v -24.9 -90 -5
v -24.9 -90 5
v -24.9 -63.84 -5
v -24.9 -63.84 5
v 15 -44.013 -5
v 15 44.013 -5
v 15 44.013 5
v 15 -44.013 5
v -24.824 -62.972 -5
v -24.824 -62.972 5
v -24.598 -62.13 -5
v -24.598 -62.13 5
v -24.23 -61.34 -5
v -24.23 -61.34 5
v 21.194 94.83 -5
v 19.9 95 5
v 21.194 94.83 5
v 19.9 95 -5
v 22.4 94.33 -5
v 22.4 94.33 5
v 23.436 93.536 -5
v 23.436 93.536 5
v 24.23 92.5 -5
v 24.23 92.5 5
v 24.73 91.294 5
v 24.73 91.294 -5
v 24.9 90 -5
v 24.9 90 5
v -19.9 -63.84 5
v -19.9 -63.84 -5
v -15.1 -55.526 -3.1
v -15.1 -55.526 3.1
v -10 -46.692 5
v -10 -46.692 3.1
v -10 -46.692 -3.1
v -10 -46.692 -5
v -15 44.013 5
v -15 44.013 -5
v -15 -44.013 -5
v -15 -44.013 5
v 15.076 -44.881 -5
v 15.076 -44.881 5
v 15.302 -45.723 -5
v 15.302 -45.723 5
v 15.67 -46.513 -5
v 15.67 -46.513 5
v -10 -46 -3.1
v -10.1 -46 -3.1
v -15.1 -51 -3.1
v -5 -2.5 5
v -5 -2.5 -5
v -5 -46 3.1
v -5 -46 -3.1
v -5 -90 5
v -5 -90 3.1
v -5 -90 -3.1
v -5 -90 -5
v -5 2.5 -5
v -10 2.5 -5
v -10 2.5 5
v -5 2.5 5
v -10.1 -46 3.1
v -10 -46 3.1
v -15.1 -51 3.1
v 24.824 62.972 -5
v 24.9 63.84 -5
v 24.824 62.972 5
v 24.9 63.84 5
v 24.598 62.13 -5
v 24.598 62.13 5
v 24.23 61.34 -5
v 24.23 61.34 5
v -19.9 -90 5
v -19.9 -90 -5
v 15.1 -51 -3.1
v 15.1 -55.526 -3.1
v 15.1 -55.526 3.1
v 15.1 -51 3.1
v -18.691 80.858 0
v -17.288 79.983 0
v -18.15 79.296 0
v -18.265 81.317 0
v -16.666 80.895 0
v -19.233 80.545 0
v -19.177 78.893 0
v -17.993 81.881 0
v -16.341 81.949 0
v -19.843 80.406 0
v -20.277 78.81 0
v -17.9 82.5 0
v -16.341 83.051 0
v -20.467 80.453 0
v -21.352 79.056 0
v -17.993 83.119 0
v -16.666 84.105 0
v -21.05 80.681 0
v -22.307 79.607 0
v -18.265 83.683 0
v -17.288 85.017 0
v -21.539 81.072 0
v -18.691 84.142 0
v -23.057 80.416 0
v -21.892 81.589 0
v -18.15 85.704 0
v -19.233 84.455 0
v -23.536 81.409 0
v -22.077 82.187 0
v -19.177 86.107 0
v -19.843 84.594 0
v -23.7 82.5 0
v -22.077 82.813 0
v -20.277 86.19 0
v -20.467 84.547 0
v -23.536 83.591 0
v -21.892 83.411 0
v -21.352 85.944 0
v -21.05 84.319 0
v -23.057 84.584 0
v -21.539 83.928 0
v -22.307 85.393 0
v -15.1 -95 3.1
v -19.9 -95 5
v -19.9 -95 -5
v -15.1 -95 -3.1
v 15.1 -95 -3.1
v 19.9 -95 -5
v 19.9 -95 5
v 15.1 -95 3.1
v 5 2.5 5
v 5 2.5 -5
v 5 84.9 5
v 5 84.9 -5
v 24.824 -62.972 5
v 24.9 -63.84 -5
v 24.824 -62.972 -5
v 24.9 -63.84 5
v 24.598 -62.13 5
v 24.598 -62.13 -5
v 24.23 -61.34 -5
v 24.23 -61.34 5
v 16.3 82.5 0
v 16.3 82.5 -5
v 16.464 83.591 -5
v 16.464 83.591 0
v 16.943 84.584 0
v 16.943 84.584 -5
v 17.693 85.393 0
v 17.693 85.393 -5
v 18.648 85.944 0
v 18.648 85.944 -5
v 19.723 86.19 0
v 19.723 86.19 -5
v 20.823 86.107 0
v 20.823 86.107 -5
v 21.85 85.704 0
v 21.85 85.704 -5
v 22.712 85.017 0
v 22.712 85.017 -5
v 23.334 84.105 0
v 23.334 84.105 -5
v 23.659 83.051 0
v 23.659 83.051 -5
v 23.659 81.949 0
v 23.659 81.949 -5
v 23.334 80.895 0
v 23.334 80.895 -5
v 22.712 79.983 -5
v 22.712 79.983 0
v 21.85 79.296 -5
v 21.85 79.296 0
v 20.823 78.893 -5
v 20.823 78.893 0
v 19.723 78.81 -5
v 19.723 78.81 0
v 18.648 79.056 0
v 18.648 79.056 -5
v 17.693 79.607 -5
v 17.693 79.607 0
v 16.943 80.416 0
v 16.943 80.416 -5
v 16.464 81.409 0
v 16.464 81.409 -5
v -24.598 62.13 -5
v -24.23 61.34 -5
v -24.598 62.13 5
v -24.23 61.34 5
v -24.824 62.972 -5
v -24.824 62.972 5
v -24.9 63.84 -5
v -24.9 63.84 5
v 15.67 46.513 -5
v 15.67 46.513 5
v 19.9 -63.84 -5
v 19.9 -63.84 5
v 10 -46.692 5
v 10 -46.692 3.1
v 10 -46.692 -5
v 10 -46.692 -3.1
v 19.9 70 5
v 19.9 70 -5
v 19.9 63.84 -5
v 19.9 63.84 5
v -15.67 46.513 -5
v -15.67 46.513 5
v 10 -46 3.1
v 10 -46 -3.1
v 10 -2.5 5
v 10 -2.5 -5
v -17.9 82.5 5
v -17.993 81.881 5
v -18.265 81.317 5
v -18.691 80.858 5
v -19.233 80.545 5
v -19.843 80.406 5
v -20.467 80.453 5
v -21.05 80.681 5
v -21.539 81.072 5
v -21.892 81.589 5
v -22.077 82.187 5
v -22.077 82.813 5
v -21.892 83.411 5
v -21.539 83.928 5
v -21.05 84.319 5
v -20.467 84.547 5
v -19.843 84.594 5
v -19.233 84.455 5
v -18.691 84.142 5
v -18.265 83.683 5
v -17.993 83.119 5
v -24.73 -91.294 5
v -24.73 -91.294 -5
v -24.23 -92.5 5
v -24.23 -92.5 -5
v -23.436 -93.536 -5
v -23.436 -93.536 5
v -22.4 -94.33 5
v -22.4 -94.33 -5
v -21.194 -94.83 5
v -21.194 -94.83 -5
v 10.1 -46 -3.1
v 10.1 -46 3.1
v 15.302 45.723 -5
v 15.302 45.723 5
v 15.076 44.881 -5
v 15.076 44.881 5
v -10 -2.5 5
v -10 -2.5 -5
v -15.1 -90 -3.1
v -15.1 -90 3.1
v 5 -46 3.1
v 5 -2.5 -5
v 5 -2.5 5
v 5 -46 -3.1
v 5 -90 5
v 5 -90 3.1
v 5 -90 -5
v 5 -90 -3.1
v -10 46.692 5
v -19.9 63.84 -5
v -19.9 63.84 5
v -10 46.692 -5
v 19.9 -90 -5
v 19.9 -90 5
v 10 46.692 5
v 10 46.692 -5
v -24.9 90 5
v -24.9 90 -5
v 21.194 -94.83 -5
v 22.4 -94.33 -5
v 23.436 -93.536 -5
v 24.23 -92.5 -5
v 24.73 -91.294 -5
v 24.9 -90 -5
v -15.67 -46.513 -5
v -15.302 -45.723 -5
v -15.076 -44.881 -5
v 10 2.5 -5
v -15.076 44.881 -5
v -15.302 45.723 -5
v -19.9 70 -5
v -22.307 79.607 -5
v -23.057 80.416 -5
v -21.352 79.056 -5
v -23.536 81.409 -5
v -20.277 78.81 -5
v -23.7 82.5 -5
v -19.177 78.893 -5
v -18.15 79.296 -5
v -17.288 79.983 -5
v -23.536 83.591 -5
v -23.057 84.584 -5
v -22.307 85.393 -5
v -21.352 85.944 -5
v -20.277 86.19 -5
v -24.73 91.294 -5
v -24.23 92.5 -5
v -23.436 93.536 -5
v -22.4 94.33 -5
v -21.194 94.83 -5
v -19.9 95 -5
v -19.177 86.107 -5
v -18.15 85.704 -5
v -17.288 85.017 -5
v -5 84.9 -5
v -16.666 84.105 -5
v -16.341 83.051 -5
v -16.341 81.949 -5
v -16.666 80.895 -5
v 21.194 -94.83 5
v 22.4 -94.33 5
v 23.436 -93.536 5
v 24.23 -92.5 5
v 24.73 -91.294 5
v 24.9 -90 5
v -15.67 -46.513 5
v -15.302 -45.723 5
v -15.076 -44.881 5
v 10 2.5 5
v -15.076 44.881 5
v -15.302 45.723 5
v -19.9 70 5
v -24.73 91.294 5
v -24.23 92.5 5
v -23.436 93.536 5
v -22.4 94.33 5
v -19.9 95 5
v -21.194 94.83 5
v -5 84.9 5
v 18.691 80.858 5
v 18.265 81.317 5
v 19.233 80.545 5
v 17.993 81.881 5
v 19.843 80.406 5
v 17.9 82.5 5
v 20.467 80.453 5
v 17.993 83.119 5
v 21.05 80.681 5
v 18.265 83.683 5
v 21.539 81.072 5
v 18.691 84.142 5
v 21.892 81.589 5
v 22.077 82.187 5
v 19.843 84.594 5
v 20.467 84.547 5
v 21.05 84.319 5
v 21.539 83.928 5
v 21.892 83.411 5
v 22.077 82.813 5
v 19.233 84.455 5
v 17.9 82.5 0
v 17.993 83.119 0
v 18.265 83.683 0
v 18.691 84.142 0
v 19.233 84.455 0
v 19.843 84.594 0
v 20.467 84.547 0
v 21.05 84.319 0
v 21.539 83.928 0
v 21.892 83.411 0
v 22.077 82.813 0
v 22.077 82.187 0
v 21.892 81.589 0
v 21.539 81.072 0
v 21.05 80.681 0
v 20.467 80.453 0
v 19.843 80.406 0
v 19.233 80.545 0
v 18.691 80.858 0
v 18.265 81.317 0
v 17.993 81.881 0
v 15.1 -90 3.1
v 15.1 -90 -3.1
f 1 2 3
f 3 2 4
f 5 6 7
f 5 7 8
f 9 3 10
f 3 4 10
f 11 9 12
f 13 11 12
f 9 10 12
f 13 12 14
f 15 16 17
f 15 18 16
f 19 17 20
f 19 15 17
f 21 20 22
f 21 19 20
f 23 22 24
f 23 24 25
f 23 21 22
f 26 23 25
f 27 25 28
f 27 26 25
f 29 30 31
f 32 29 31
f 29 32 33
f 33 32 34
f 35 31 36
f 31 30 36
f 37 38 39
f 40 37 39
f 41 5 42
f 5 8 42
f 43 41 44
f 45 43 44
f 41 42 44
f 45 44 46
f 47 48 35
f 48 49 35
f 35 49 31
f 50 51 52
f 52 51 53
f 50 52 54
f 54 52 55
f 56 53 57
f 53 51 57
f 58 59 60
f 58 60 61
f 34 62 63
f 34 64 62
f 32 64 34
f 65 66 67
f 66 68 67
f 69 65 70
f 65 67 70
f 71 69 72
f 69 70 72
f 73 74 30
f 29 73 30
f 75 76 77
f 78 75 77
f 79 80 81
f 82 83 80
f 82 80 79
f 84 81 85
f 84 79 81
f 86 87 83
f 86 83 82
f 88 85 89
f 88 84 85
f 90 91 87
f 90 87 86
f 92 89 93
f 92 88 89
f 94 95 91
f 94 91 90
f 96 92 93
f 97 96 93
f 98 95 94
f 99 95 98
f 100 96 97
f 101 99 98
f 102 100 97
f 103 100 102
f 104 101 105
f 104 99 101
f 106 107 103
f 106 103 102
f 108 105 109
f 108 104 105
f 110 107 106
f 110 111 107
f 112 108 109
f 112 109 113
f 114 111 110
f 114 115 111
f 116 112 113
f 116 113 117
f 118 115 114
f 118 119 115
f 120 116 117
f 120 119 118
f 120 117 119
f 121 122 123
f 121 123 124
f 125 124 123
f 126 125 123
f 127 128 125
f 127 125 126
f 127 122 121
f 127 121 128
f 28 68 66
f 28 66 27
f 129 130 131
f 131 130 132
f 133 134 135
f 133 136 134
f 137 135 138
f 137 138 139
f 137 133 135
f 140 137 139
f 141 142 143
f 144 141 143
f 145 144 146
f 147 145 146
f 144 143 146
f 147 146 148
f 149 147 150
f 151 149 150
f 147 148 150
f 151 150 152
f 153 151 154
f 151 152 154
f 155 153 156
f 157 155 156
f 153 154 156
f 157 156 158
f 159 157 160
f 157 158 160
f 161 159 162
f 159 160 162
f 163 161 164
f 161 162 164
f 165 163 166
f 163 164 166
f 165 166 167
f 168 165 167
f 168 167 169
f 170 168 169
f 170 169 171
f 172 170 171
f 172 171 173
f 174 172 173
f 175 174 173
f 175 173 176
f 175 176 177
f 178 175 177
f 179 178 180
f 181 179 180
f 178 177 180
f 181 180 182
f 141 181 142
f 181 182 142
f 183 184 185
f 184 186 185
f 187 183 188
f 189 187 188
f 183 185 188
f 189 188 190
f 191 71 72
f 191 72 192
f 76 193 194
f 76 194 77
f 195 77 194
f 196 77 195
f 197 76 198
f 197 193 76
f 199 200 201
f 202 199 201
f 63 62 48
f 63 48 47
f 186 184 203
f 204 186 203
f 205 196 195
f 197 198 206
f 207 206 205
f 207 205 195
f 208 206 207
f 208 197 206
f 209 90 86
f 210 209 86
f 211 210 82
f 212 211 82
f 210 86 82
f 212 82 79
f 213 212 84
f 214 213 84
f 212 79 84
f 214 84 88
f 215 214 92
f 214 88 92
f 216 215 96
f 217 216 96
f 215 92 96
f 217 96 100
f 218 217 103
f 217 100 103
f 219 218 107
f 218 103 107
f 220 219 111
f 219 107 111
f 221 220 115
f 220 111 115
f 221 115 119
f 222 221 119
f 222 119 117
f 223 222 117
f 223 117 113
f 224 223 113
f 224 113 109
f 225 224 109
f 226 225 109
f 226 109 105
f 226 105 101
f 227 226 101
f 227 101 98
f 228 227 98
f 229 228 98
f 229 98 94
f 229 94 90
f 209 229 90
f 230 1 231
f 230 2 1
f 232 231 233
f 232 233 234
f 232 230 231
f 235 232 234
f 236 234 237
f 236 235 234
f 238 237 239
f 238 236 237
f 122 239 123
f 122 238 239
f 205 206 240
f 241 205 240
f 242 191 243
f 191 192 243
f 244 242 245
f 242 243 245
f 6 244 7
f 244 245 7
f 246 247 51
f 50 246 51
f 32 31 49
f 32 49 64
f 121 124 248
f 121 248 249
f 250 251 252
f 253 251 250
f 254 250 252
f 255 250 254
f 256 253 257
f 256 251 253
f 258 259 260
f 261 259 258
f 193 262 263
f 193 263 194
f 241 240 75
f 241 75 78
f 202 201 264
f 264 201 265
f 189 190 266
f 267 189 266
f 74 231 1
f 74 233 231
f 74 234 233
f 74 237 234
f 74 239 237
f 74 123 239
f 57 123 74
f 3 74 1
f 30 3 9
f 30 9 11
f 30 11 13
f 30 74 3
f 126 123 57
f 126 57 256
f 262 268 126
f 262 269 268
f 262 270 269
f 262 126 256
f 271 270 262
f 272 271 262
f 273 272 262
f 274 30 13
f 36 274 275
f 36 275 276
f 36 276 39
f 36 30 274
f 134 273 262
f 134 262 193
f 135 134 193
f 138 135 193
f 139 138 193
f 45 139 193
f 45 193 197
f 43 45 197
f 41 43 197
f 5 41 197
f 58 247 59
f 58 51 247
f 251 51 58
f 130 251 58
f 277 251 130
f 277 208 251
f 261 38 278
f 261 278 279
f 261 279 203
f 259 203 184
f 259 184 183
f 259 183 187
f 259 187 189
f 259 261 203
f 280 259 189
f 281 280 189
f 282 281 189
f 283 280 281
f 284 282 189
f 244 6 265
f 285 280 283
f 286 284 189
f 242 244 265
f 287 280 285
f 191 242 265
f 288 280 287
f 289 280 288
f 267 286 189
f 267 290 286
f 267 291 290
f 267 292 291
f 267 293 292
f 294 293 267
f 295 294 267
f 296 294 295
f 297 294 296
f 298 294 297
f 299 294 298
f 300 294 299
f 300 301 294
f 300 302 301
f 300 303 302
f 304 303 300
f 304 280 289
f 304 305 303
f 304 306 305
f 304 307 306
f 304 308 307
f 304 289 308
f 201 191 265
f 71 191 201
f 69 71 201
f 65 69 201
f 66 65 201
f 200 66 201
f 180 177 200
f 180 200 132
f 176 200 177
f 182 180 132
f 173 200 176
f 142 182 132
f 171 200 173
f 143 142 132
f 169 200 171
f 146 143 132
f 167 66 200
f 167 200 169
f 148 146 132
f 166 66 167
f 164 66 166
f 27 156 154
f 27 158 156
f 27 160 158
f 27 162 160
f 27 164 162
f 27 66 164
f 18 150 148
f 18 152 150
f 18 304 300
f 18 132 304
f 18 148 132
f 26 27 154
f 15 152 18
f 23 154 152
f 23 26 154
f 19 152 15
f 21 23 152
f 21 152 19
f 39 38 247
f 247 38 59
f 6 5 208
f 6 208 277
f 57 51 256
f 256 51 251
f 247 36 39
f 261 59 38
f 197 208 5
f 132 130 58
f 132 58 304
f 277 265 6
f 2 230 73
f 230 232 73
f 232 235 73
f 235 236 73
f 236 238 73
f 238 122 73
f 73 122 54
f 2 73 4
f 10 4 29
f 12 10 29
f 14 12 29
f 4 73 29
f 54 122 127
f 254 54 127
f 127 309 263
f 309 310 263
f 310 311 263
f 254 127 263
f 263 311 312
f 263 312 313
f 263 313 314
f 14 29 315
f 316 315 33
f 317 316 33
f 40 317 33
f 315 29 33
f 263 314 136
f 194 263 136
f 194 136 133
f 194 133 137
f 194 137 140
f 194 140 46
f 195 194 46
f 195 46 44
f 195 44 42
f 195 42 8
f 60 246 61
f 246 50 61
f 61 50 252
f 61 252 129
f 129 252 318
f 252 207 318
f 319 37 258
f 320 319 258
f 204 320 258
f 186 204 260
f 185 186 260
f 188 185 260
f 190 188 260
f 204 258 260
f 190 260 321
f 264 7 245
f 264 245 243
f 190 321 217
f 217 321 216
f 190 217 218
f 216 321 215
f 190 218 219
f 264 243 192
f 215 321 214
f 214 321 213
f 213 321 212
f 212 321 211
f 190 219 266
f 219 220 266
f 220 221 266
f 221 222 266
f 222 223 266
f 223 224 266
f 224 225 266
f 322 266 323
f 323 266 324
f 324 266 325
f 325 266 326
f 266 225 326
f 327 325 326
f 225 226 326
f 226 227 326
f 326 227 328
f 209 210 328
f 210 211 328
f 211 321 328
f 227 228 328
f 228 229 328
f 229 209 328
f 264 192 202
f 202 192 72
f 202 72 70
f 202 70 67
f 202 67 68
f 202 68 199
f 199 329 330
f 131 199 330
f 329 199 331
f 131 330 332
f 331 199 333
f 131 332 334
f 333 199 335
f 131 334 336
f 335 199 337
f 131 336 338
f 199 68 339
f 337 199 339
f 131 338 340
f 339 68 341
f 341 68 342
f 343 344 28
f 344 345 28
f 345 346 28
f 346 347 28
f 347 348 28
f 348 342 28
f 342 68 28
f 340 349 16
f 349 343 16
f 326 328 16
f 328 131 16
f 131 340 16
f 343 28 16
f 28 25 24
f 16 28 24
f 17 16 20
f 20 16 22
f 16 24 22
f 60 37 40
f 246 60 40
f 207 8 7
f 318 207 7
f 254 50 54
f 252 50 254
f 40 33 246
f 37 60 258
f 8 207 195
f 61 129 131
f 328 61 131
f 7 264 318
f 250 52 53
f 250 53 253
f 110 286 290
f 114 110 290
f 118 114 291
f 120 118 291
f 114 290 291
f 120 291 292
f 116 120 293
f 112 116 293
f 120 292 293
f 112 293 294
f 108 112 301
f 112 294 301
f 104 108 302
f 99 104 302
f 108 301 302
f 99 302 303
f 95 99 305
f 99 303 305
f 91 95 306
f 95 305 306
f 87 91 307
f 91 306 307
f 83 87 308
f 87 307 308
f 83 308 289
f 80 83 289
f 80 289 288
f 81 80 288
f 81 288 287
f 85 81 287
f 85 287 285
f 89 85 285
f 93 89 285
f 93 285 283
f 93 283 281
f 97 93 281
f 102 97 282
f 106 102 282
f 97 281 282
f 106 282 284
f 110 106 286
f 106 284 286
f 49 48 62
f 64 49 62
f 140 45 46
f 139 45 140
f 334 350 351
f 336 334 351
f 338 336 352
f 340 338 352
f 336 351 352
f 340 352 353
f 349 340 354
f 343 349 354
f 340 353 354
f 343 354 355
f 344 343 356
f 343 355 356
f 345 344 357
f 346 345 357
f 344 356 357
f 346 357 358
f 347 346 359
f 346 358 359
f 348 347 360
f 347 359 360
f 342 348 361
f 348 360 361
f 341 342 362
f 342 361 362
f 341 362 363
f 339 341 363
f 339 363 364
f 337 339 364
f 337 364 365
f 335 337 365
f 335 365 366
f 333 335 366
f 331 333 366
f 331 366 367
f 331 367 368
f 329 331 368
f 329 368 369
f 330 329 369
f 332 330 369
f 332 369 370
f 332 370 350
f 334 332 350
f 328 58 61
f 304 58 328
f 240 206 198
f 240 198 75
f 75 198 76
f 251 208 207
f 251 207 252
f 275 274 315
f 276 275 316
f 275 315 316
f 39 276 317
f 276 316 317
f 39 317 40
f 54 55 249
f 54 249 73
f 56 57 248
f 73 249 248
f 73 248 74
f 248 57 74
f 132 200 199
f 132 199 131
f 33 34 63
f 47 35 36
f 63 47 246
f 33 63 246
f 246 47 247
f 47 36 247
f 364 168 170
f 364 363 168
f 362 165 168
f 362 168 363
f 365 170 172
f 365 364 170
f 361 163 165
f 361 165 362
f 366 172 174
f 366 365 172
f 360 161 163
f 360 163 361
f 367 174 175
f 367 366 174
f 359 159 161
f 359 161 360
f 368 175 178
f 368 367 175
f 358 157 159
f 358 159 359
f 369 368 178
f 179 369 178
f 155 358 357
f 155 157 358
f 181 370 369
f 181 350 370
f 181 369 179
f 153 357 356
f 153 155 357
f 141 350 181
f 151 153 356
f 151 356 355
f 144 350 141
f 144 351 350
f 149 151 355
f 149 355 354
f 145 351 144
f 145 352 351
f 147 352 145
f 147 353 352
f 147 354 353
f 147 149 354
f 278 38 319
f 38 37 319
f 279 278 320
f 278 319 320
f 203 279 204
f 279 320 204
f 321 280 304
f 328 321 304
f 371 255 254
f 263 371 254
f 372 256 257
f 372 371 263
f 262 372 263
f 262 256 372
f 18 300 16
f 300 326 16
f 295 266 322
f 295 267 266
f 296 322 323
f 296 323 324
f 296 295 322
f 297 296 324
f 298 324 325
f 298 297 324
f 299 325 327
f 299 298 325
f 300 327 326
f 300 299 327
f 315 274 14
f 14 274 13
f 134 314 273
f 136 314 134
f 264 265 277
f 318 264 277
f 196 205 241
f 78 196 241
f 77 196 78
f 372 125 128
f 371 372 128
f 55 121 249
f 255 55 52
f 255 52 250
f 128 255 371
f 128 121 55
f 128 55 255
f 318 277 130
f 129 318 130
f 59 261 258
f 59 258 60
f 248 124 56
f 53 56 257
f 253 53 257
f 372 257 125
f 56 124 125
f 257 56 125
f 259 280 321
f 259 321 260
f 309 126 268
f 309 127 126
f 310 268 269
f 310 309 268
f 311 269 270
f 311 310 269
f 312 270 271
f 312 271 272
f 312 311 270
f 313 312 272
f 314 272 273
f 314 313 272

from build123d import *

# Parameters (mm, degrees)
SKETCH_1_W          = 49.8
SKETCH_1_H          = 190
EXTRUDE_1_DEPTH     = 5
CUT_EXTRUDE_1_DEPTH = 99.71681721
FILLET_1_R          = 5
CUT_EXTRUDE_2_DEPTH = 99.71681721
CHAMFER_2_SIZE      = 20
CUT_EXTRUDE_6_REACH = 100.717
SKETCH_7_R          = 2.1
SKETCH_3_W          = 30.2
SKETCH_3_H          = 6.2
CUT_EXTRUDE_7_DEPTH = 49
CHAMFER_3_SIZE      = 5
SKETCH_9_R          = 3.7
CUT_EXTRUDE_8_DEPTH = 5


with BuildPart() as part:
    # 草图1 → 凸台-拉伸1 (new, symmetric)
    with BuildSketch(Plane.XY):
        Rectangle(SKETCH_1_W, SKETCH_1_H)
    extrude(amount=EXTRUDE_1_DEPTH, both=True)

    # 草图4 → 切除-拉伸1 (cut, through all)
    with BuildSketch(Plane(origin=(0, 0, -5), x_dir=(-1, 0, 0), z_dir=(0, 0, -1))):
        Polygon((-24.9, 62.5), (-15, 45.352697005), (-15, -45.352697005), (-24.9, -62.5), align=None)
        Polygon((24.9, -62.5), (24.9, 62.5), (15, 45.352697005), (15, -45.352697005), align=None)
    extrude(amount=-CUT_EXTRUDE_1_DEPTH, mode=Mode.SUBTRACT)

    # 圆角1
    fillet_1_edges = [part.edges().sort_by_distance(p)[0] for p in [
        (24.9, -62.5, 0),
        (24.9, 62.5, 0),
        (15, 45.352697005, 0),
        (15, -45.352697005, 0),
        (-24.9, -62.5, 0),
        (-15, -45.352697005, 0),
        (-15, 45.352697005, 0),
        (-24.9, 62.5, 0),
        (24.9, -95, 0),
        (-24.9, -95, 0),
        (-24.9, 95, 0),
        (24.9, 95, 0),
    ]]
    fillet(fillet_1_edges, radius=FILLET_1_R)

    # 草图5 → 切除-拉伸2 (cut, through all)
    with BuildSketch(Plane(origin=(0, 0, -5), x_dir=(-1, 0, 0), z_dir=(0, 0, -1))):
        Polygon((-19.9, 90), (-19.9, 63.839745962), (-10, 46.692442967), (-10, 2.5), (-5, 2.5), (-5, 90), align=None)
        Polygon((5, 90), (19.9, 90), (19.9, 63.839745962), (10, 46.692442967), (10, 2.5), (5, 2.5), align=None)
        Polygon((19.9, -90), (19.9, -63.839745962), (10, -46.692442967), (10, -2.5), (5, -2.5), (5, -90), align=None)
        Polygon((-5, -90), (-19.9, -90), (-19.9, -63.839745962), (-10, -46.692442967), (-10, -2.5), (-5, -2.5), align=None)
    extrude(amount=-CUT_EXTRUDE_2_DEPTH, mode=Mode.SUBTRACT)

    # 倒角2
    # the kernel refuses this chamfer: 20 mm, written as the material it adds along each edge
    with BuildSketch(Plane(origin=(-19.9, 90, -5), x_dir=(-0.027495876610586147, -0.9996219169112968, 0), z_dir=(0, 0, 1))) as chamfer_2_piece_1:
        Polygon((CHAMFER_2_SIZE * 0.999621916911, CHAMFER_2_SIZE * 0.0274958766106), (-CHAMFER_2_SIZE * 0.0274958766106, CHAMFER_2_SIZE * 0.999621916911), (0, 0), align=None)
    extrude(amount=10)
    with BuildSketch(Plane(origin=(19.9, 90, -5), x_dir=(0.027495876610586147, -0.9996219169112968, 0), z_dir=(0, 0, 1))) as chamfer_2_piece_2:
        Polygon((CHAMFER_2_SIZE * 0.999621916911, -CHAMFER_2_SIZE * 0.0274958766106), (-CHAMFER_2_SIZE * 0.0274958766106, -CHAMFER_2_SIZE * 0.999621916911), (0, 0), align=None)
    extrude(amount=10)

    # 草图7 → 切除-拉伸6 (cut, up to next)
    with BuildSketch(Plane(origin=(0, 0, -5), x_dir=(-1, 0, 0), z_dir=(0, 0, -1)), mode=Mode.PRIVATE) as cut_extrude_6_sk1:
        with Locations((-20, 82.5)):
            Circle(SKETCH_7_R)
    cut_extrude_6_tool1 = extrude(cut_extrude_6_sk1.sketch, amount=-CUT_EXTRUDE_6_REACH, mode=Mode.PRIVATE) & part.part
    # 草图7 → 切除-拉伸6 (cut, up to next)
    with BuildSketch(Plane(origin=(0, 0, -5), x_dir=(-1, 0, 0), z_dir=(0, 0, -1)), mode=Mode.PRIVATE) as cut_extrude_6_sk2:
        with Locations(Location((20, 82.5, 0), (0, 0, 180))):
            Circle(SKETCH_7_R)
    cut_extrude_6_tool2 = extrude(cut_extrude_6_sk2.sketch, amount=-CUT_EXTRUDE_6_REACH, mode=Mode.PRIVATE) & part.part
    add(cut_extrude_6_tool1.solids().sort_by_distance((20, 82.5, -5))[0], mode=Mode.SUBTRACT)
    add(cut_extrude_6_tool2.solids().sort_by_distance((-20, 82.5, -5))[0], mode=Mode.SUBTRACT)

    # 草图3 → 切除-拉伸7 (cut)
    with BuildSketch(Plane.XZ.offset(95)):
        Rectangle(SKETCH_3_W, SKETCH_3_H)
    extrude(amount=-CUT_EXTRUDE_7_DEPTH, mode=Mode.SUBTRACT)

    # 倒角3
    chamfer_3_edges = [part.edges().sort_by_distance(p)[0] for p in [
        (-15.1, -46, 0),
        (15.1, -46, 0),
    ]]
    chamfer(chamfer_3_edges, length=CHAMFER_3_SIZE)

    # 草图9 → 切除-拉伸8 (cut)
    with BuildSketch(Plane(origin=(0, 0, -5), x_dir=(-1, 0, 0), z_dir=(0, 0, -1))):
        with Locations((-20, 82.5)):
            Circle(SKETCH_9_R)
        with Locations((20, 82.5)):
            Circle(SKETCH_9_R)
    extrude(amount=-CUT_EXTRUDE_8_DEPTH, mode=Mode.SUBTRACT)


solid = part.part
